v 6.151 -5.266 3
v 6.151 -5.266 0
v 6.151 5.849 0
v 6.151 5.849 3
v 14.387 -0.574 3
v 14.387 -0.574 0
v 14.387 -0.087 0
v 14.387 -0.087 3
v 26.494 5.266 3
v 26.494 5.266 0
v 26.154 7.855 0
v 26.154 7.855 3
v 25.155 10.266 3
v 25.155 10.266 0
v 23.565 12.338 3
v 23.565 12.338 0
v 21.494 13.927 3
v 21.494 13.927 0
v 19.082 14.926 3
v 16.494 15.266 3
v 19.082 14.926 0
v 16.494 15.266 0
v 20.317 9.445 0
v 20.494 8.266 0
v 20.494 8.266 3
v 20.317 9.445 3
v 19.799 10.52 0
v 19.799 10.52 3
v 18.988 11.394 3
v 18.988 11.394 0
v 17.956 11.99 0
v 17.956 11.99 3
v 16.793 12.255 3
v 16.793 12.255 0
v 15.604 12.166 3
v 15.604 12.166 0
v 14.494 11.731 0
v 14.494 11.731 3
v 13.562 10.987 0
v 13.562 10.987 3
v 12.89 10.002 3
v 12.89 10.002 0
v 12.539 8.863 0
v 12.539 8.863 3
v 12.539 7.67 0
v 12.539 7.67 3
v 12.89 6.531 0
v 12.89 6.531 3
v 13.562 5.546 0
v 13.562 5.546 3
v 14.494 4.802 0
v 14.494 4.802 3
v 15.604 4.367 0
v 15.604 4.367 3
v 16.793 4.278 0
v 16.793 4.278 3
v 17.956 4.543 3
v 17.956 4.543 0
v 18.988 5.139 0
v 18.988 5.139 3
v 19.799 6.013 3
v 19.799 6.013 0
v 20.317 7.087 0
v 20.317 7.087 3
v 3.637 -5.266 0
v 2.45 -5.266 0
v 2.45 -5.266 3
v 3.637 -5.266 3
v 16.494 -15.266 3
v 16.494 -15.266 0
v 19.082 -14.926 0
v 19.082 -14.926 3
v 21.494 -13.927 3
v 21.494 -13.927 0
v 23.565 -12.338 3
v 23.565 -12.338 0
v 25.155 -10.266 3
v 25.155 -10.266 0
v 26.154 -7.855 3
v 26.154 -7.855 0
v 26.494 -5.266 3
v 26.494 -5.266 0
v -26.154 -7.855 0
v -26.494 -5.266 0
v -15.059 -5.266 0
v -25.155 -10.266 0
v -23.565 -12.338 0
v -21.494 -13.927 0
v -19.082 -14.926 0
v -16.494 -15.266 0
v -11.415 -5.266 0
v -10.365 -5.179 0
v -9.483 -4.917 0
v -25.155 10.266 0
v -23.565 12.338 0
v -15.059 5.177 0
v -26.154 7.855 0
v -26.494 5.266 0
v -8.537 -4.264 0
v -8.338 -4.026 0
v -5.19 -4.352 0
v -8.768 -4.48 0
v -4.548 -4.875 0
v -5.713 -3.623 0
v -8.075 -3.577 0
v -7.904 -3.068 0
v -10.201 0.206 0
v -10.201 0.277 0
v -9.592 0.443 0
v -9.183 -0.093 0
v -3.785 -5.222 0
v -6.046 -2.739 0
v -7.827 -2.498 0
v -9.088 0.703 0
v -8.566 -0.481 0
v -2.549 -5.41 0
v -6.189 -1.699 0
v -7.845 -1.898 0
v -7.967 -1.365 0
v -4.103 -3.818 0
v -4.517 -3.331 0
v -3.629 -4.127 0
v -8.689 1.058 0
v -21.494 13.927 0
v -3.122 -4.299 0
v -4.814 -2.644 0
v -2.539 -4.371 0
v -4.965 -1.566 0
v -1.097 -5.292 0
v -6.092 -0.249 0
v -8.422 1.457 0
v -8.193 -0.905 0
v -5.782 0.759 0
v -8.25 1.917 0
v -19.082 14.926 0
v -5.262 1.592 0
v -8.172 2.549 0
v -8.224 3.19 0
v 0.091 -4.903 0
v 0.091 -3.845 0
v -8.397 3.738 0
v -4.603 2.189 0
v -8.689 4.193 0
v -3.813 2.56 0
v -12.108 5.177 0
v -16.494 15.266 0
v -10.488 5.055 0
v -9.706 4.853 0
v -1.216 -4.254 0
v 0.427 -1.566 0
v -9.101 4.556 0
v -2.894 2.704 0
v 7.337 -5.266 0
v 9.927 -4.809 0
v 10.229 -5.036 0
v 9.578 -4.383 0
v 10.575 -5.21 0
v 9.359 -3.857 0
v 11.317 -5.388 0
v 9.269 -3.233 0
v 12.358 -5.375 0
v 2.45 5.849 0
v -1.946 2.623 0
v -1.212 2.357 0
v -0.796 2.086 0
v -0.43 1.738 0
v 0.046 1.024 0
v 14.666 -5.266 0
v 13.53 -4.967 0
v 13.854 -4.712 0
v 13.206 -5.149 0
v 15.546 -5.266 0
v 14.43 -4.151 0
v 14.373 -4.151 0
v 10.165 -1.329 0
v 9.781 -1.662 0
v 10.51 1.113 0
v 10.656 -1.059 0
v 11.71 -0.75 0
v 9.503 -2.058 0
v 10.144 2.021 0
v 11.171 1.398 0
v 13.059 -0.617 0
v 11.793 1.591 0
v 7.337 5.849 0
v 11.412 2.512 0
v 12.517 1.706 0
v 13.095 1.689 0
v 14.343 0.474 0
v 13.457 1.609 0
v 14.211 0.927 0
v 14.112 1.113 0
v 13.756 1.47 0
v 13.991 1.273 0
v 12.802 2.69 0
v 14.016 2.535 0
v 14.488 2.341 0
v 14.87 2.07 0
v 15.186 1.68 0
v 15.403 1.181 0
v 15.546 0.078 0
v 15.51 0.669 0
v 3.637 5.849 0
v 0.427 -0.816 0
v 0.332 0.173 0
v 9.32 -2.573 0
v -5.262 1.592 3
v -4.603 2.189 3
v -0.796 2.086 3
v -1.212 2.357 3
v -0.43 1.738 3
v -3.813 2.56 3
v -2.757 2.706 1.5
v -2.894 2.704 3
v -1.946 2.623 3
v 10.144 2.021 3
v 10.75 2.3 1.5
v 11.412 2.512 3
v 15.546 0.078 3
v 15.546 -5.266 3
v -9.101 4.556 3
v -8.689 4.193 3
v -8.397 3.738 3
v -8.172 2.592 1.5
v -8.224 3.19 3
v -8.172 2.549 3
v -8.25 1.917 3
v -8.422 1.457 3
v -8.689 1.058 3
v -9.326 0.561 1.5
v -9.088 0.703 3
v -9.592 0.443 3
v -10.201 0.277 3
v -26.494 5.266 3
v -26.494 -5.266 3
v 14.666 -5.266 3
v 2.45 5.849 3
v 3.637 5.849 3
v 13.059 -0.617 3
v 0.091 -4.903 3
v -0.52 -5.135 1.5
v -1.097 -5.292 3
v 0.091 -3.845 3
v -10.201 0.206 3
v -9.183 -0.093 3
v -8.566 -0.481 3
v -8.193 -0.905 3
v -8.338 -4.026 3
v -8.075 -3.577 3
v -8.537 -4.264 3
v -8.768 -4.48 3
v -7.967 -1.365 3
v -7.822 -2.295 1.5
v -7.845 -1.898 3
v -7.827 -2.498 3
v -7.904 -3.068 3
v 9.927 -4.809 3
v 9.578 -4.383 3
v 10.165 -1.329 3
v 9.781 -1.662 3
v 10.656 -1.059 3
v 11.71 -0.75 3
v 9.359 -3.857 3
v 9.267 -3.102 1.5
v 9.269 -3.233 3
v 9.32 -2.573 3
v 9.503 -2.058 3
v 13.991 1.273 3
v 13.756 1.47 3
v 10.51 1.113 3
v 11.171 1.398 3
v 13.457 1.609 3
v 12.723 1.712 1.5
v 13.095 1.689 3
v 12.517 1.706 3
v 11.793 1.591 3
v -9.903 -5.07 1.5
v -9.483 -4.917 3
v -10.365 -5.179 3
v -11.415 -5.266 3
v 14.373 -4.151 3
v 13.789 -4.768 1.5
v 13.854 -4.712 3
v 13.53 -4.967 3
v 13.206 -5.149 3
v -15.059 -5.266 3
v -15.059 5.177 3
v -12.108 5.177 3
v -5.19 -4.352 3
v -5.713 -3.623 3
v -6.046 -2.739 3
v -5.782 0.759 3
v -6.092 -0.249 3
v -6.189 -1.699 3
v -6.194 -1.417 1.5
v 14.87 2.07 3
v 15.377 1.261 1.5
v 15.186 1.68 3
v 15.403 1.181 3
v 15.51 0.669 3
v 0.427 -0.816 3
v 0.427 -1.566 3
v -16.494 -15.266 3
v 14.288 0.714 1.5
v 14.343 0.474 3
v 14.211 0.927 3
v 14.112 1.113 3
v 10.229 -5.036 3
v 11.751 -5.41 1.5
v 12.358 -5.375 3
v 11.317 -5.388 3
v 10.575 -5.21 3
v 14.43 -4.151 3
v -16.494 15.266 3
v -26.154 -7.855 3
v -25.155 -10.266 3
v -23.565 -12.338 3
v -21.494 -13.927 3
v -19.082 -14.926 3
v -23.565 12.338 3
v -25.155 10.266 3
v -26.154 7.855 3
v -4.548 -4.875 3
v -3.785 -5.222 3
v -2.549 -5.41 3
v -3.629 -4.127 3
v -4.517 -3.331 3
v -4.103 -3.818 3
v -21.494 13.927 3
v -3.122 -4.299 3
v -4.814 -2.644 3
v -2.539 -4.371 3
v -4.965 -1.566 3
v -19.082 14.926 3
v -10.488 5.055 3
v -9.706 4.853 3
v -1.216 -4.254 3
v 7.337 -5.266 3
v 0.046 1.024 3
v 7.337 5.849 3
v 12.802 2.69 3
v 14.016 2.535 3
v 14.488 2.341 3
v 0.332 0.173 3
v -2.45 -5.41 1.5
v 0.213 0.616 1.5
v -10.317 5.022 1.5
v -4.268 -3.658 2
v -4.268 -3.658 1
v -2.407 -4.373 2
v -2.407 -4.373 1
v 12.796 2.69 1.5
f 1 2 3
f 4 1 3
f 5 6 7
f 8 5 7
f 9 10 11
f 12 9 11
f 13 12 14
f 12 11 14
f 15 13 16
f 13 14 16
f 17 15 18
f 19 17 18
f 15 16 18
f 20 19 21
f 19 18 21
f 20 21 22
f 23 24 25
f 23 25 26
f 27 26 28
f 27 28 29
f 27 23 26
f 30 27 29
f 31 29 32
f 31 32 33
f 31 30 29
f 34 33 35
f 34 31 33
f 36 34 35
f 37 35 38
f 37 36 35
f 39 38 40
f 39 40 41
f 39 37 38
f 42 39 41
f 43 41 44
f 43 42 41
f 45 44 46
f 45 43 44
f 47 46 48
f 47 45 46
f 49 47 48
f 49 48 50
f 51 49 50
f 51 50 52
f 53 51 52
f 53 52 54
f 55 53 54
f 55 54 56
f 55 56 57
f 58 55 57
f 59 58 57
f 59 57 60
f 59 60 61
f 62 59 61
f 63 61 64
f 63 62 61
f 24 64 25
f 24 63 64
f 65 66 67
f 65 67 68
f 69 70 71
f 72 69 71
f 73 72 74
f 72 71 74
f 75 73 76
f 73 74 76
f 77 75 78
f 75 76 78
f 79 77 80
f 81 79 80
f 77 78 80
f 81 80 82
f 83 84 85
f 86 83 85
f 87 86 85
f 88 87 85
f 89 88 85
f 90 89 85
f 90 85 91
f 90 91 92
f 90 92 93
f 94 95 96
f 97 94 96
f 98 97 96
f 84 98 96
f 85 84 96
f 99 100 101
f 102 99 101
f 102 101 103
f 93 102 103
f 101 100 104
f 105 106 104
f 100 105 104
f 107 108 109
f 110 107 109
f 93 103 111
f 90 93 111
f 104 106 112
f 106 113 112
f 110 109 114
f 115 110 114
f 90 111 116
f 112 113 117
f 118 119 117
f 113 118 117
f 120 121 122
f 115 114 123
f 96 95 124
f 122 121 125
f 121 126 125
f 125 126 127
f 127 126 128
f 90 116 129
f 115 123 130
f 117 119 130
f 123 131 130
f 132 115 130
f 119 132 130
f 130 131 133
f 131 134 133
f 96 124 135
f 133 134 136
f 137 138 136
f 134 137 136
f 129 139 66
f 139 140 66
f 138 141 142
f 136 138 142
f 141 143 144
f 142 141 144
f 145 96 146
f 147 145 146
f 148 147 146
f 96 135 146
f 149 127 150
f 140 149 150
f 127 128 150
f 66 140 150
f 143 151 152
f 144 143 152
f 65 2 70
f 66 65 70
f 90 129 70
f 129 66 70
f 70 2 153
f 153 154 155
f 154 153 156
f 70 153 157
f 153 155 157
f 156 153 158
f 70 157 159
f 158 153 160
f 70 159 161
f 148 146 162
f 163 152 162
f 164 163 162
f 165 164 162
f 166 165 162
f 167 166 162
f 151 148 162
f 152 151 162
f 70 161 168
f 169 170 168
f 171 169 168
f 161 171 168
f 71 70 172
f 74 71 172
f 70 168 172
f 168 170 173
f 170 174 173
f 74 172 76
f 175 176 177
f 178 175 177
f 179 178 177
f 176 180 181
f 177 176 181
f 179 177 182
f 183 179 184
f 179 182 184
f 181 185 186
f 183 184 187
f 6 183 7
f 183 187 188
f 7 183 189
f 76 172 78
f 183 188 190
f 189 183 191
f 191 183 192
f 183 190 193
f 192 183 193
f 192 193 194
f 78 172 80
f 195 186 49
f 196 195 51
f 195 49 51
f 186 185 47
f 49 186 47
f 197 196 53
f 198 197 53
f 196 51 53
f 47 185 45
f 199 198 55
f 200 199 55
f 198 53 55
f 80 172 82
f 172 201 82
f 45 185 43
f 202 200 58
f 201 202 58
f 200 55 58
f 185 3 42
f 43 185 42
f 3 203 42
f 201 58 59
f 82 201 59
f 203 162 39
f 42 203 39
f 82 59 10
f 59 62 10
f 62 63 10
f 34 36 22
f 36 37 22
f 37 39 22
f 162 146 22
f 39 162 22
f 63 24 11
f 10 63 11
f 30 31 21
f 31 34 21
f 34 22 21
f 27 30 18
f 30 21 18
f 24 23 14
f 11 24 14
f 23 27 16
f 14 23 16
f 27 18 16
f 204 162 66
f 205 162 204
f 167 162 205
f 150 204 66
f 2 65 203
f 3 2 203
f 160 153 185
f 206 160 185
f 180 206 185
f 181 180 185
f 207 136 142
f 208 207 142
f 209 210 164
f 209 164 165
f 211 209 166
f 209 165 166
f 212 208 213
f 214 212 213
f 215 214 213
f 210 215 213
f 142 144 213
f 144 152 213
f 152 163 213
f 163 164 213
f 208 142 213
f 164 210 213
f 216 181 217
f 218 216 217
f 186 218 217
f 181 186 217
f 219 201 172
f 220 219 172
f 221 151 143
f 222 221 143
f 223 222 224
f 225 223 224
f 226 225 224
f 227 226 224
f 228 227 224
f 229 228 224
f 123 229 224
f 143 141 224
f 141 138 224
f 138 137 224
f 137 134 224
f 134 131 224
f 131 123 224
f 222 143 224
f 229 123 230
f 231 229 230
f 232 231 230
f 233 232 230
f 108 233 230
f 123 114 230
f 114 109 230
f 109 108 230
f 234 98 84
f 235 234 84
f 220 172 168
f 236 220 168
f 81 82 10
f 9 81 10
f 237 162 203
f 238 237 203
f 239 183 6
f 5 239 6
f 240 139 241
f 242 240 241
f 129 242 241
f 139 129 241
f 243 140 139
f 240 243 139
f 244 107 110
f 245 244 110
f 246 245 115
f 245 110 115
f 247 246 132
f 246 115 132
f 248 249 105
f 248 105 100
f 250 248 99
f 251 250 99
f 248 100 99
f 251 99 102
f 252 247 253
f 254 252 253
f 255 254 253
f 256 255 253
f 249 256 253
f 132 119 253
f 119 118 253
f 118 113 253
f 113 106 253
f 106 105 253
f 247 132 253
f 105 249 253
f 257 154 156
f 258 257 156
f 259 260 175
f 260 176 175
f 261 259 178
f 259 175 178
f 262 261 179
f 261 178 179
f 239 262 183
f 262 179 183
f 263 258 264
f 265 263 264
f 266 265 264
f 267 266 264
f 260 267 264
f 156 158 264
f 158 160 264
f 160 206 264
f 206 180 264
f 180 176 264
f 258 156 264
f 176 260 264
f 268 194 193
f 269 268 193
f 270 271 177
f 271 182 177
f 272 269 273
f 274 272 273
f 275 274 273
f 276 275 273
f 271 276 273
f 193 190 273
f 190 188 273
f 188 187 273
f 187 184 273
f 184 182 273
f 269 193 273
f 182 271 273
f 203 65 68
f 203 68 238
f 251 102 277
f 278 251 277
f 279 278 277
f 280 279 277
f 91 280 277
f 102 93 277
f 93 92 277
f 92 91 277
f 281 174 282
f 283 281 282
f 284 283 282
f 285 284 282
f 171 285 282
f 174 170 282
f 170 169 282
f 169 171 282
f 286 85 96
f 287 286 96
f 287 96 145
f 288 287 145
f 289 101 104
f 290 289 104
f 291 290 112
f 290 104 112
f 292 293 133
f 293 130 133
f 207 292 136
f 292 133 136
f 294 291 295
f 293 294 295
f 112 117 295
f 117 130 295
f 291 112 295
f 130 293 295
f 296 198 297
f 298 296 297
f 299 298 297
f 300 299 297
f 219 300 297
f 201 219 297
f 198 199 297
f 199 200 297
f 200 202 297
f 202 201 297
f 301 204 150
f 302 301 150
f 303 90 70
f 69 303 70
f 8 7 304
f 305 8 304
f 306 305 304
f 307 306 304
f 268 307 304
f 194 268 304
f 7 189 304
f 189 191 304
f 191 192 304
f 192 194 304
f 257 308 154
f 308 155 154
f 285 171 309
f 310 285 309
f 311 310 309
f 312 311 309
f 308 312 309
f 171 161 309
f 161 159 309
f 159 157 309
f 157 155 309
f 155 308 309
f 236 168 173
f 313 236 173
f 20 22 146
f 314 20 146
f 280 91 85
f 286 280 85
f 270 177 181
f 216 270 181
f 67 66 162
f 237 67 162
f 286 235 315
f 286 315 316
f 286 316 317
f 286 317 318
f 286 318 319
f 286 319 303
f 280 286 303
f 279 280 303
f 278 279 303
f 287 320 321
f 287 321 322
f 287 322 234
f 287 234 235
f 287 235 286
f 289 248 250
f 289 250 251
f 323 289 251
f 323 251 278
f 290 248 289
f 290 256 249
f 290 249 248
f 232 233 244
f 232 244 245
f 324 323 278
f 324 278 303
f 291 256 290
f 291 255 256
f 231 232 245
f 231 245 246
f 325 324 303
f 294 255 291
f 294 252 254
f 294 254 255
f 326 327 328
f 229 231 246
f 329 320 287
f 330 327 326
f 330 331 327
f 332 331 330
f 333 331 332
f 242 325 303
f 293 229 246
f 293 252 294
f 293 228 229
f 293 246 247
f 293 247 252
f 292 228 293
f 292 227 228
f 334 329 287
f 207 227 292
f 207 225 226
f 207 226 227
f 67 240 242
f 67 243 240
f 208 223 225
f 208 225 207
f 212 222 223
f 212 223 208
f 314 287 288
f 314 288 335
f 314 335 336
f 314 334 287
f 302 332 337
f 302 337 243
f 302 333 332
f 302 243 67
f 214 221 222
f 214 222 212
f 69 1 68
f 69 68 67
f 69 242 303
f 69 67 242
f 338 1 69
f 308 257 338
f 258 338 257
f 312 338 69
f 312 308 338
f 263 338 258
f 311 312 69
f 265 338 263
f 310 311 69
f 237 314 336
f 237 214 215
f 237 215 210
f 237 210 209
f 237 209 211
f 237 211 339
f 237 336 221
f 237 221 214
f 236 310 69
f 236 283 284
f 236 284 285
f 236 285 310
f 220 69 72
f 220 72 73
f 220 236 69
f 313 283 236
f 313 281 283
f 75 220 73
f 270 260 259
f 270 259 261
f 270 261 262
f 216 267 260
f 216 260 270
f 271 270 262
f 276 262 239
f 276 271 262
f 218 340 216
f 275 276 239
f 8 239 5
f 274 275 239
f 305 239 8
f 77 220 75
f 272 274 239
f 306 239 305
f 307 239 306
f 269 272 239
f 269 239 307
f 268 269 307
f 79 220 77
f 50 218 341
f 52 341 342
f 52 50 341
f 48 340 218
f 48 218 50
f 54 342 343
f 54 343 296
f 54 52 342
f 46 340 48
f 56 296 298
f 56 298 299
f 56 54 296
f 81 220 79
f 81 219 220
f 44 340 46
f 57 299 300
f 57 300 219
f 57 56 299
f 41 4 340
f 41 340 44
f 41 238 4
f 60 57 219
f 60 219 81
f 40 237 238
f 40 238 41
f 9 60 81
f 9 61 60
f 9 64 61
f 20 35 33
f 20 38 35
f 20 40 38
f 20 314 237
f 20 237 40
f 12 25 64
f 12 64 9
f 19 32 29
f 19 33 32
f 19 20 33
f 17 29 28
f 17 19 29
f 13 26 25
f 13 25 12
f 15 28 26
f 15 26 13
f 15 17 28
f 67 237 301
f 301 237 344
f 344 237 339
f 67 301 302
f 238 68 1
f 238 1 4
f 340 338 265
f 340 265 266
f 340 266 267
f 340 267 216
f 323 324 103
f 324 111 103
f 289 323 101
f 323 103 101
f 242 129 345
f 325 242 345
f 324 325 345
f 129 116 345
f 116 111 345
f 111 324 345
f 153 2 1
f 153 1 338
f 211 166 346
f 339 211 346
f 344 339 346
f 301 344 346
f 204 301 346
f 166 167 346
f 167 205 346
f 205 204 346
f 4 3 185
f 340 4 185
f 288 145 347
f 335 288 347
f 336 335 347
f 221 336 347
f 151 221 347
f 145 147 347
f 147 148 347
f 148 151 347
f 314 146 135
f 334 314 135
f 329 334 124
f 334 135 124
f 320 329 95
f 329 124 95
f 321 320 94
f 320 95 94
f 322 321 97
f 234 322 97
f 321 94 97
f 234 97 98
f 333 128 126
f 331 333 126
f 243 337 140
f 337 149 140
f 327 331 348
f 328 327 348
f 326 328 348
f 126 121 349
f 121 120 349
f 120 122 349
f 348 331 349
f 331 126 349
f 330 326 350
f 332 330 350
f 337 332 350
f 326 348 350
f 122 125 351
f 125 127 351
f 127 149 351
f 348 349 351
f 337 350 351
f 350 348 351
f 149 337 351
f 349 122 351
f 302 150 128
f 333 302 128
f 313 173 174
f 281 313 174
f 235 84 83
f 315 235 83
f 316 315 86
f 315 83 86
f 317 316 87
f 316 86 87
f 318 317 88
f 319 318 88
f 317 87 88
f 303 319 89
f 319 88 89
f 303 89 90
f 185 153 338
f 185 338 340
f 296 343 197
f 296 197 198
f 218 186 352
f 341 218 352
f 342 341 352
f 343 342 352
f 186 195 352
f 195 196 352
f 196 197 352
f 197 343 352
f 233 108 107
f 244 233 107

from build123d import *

# Parameters (mm, degrees)
F0_W     = 1.1863263941
F0_H     = 11.1158097386
F0_R     = 4
F1_DEPTH = 3


with BuildPart() as f1:
    # F0 (on Top) → F1 (new body)
    with BuildSketch(Plane.XY):
        with BuildLine():
            ThreePointArc((26.4942798836, 5.2664663043), (23.5653476954, 12.3375341161), (16.4942798836, 15.2664663043))
            Line((16.4942798836, 15.2664663043), (-16.4942798836, 15.2664663043))
            ThreePointArc((-16.4942798836, 15.2664663043), (-23.5653476954, 12.3375341161), (-26.4942798836, 5.2664663043))
            Line((-26.4942798836, 5.2664663043), (-26.4942798836, -5.2664663043))
            ThreePointArc((-26.4942798836, -5.2664663043), (-23.5653476954, -12.3375341161), (-16.4942798836, -15.2664663043))
            Line((-16.4942798836, -15.2664663043), (16.4942798836, -15.2664663043))
            ThreePointArc((16.4942798836, -15.2664663043), (23.5653476954, -12.3375341161), (26.4942798836, -5.2664663043))
            Line((26.4942798836, -5.2664663043), (26.4942798836, 5.2664663043))
        make_face()
        with BuildLine():
            Line((-15.0588020888, -5.2664663043), (-15.0588020888, 5.1773203903))
            Line((-15.0588020888, 5.1773203903), (-12.107843756, 5.1773203903))
            add(Edge.make_bspline(
                [(-12.107843756, 5.1773203903), (-10.0300582219, 5.1773203903), (-9.1008835028, 4.5555847849)],
                knots=[0, 0, 0, 1, 1, 1], degree=2))
            add(Edge.make_bspline(
                [(-9.1008835028, 4.5555847849), (-8.1717087838, 3.9338491795), (-8.1717087838, 2.5920888841)],
                knots=[0, 0, 0, 1, 1, 1], degree=2))
            add(Edge.make_bspline(
                [(-8.1717087838, 2.5920888841), (-8.1717087838, 1.6617712688), (-8.6894408228, 1.0583220047)],
                knots=[0, 0, 0, 1, 1, 1], degree=2))
            add(Edge.make_bspline(
                [(-8.6894408228, 1.0583220047), (-9.2071728618, 0.4548727407), (-10.2014926719, 0.2765809127)],
                knots=[0, 0, 0, 1, 1, 1], degree=2))
            Line((-10.2014926719, 0.2765809127), (-10.2014926719, 0.20572134))
            add(Edge.make_bspline(
                [(-10.2014926719, 0.20572134), (-7.8219825058, -0.2011497547), (-7.8219825058, -2.2949358375)],
                knots=[0, 0, 0, 1, 1, 1], degree=2))
            add(Edge.make_bspline(
                [(-7.8219825058, -2.2949358375), (-7.8219825058, -3.6938409495), (-8.7683006698, -4.4801536269)],
                knots=[0, 0, 0, 1, 1, 1], degree=2))
            add(Edge.make_bspline(
                [(-8.7683006698, -4.4801536269), (-9.7146188339, -5.2664663043), (-11.4152485779, -5.2664663043)],
                knots=[0, 0, 0, 1, 1, 1], degree=2))
            Line((-11.4152485779, -5.2664663043), (-15.0588020888, -5.2664663043))
        make_face(mode=Mode.SUBTRACT)
        with BuildLine():
            add(Edge.make_bspline(
                [(-1.0971804801, -5.2916100236), (-1.6571996834, -5.4104712423), (-2.4503697388, -5.4104712423)],
                knots=[0, 0, 0, 1, 1, 1], degree=2))
            add(Edge.make_bspline(
                [(-2.4503697388, -5.4104712423), (-4.1852863729, -5.4104712423), (-5.1898922499, -4.3521492376)],
                knots=[0, 0, 0, 1, 1, 1], degree=2))
            add(Edge.make_bspline(
                [(-5.1898922499, -4.3521492376), (-6.194498127, -3.2938272328), (-6.194498127, -1.4171914534)],
                knots=[0, 0, 0, 1, 1, 1], degree=2))
            add(Edge.make_bspline(
                [(-6.194498127, -1.4171914534), (-6.194498127, 0.4777306674), (-5.261894719, 1.5920545924)],
                knots=[0, 0, 0, 1, 1, 1], degree=2))
            add(Edge.make_bspline(
                [(-5.261894719, 1.5920545924), (-4.3292913109, 2.7063785175), (-2.7566659561, 2.7063785175)],
                knots=[0, 0, 0, 1, 1, 1], degree=2))
            add(Edge.make_bspline(
                [(-2.7566659561, 2.7063785175), (-1.2869012714, 2.7063785175), (-0.4297290214, 1.7383453231)],
                knots=[0, 0, 0, 1, 1, 1], degree=2))
            add(Edge.make_bspline(
                [(-0.4297290214, 1.7383453231), (0.4274432287, 0.7703121287), (0.4274432287, -0.816027982)],
                knots=[0, 0, 0, 1, 1, 1], degree=2))
            Line((0.4274432287, -0.816027982), (0.4274432287, -1.5657679768))
            Line((0.4274432287, -1.5657679768), (-4.9647416723, -1.5657679768))
            add(Edge.make_bspline(
                [(-4.9647416723, -1.5657679768), (-4.9281689896, -2.9441009548), (-4.2675749089, -3.6584111632)],
                knots=[0, 0, 0, 1, 1, 1], degree=2))
            add(Edge.make_bspline(
                [(-4.2675749089, -3.6584111632), (-3.6069808282, -4.3727213716), (-2.4069396781, -4.3727213716)],
                knots=[0, 0, 0, 1, 1, 1], degree=2))
            add(Edge.make_bspline(
                [(-2.4069396781, -4.3727213716), (-1.1428963334, -4.3727213716), (0.0914317067, -3.8447032655)],
                knots=[0, 0, 0, 1, 1, 1], degree=2))
            Line((0.0914317067, -3.8447032655), (0.0914317067, -4.9030252703))
            add(Edge.make_bspline(
                [(0.0914317067, -4.9030252703), (-0.5371612767, -5.1727488049), (-1.0971804801, -5.2916100236)],
                knots=[0, 0, 0, 1, 1, 1], degree=2))
        make_face(mode=Mode.SUBTRACT)
        with BuildLine():
            Line((15.5456759268, -5.2664663043), (14.6656457501, -5.2664663043))
            Line((14.6656457501, -5.2664663043), (14.4302091054, -4.1509994829))
            Line((14.4302091054, -4.1509994829), (14.3730642888, -4.1509994829))
            add(Edge.make_bspline(
                [(14.3730642888, -4.1509994829), (13.7879013661, -4.8870247216), (13.2061671324, -5.1487479819)],
                knots=[0, 0, 0, 1, 1, 1], degree=2))
            add(Edge.make_bspline(
                [(13.2061671324, -5.1487479819), (12.6244328987, -5.4104712423), (11.7512601, -5.4104712423)],
                knots=[0, 0, 0, 1, 1, 1], degree=2))
            add(Edge.make_bspline(
                [(11.7512601, -5.4104712423), (10.5877916326, -5.4104712423), (9.9271975519, -4.8093077709)],
                knots=[0, 0, 0, 1, 1, 1], degree=2))
            add(Edge.make_bspline(
                [(9.9271975519, -4.8093077709), (9.2666034712, -4.2081442996), (9.2666034712, -3.1018206488)],
                knots=[0, 0, 0, 1, 1, 1], degree=2))
            add(Edge.make_bspline(
                [(9.2666034712, -3.1018206488), (9.2666034712, -0.7314536534), (13.0587335054, -0.61716402)],
                knots=[0, 0, 0, 1, 1, 1], degree=2))
            Line((13.0587335054, -0.61716402), (14.3867790448, -0.5737339594))
            Line((14.3867790448, -0.5737339594), (14.3867790448, -0.0868601213))
            add(Edge.make_bspline(
                [(14.3867790448, -0.0868601213), (14.3867790448, 0.8343143234), (13.9913369134, 1.2731865154)],
                knots=[0, 0, 0, 1, 1, 1], degree=2))
            add(Edge.make_bspline(
                [(13.9913369134, 1.2731865154), (13.5958947821, 1.7120587074), (12.7227219834, 1.7120587074)],
                knots=[0, 0, 0, 1, 1, 1], degree=2))
            add(Edge.make_bspline(
                [(12.7227219834, 1.7120587074), (11.744402722, 1.7120587074), (10.5100746819, 1.1131810287)],
                knots=[0, 0, 0, 1, 1, 1], degree=2))
            Line((10.5100746819, 1.1131810287), (10.1443478552, 2.0206407174))
            add(Edge.make_bspline(
                [(10.1443478552, 2.0206407174), (10.7226533999, 2.3337943128), (11.4118198889, 2.5120861408)],
                knots=[0, 0, 0, 1, 1, 1], degree=2))
            add(Edge.make_bspline(
                [(11.4118198889, 2.5120861408), (12.100986378, 2.6903779688), (12.7958673487, 2.6903779688)],
                knots=[0, 0, 0, 1, 1, 1], degree=2))
            add(Edge.make_bspline(
                [(12.7958673487, 2.6903779688), (14.1947724608, 2.6903779688), (14.8702241938, 2.0697852598)],
                knots=[0, 0, 0, 1, 1, 1], degree=2))
            add(Edge.make_bspline(
                [(14.8702241938, 2.0697852598), (15.5456759268, 1.4491925507), (15.5456759268, 0.0777169507)],
                knots=[0, 0, 0, 1, 1, 1], degree=2))
            Line((15.5456759268, 0.0777169507), (15.5456759268, -5.2664663043))
        make_face(mode=Mode.SUBTRACT)
        with Locations((3.0435329358, 0.291438565)):
            Rectangle(F0_W, F0_H, mode=Mode.SUBTRACT)
        with Locations((6.7442312634, 0.291438565)):
            Rectangle(F0_W, F0_H, mode=Mode.SUBTRACT)
        with Locations((16.4942798836, 8.2664663043)):
            Circle(F0_R, mode=Mode.SUBTRACT)
    extrude(amount=F1_DEPTH)


solid = f1.part
